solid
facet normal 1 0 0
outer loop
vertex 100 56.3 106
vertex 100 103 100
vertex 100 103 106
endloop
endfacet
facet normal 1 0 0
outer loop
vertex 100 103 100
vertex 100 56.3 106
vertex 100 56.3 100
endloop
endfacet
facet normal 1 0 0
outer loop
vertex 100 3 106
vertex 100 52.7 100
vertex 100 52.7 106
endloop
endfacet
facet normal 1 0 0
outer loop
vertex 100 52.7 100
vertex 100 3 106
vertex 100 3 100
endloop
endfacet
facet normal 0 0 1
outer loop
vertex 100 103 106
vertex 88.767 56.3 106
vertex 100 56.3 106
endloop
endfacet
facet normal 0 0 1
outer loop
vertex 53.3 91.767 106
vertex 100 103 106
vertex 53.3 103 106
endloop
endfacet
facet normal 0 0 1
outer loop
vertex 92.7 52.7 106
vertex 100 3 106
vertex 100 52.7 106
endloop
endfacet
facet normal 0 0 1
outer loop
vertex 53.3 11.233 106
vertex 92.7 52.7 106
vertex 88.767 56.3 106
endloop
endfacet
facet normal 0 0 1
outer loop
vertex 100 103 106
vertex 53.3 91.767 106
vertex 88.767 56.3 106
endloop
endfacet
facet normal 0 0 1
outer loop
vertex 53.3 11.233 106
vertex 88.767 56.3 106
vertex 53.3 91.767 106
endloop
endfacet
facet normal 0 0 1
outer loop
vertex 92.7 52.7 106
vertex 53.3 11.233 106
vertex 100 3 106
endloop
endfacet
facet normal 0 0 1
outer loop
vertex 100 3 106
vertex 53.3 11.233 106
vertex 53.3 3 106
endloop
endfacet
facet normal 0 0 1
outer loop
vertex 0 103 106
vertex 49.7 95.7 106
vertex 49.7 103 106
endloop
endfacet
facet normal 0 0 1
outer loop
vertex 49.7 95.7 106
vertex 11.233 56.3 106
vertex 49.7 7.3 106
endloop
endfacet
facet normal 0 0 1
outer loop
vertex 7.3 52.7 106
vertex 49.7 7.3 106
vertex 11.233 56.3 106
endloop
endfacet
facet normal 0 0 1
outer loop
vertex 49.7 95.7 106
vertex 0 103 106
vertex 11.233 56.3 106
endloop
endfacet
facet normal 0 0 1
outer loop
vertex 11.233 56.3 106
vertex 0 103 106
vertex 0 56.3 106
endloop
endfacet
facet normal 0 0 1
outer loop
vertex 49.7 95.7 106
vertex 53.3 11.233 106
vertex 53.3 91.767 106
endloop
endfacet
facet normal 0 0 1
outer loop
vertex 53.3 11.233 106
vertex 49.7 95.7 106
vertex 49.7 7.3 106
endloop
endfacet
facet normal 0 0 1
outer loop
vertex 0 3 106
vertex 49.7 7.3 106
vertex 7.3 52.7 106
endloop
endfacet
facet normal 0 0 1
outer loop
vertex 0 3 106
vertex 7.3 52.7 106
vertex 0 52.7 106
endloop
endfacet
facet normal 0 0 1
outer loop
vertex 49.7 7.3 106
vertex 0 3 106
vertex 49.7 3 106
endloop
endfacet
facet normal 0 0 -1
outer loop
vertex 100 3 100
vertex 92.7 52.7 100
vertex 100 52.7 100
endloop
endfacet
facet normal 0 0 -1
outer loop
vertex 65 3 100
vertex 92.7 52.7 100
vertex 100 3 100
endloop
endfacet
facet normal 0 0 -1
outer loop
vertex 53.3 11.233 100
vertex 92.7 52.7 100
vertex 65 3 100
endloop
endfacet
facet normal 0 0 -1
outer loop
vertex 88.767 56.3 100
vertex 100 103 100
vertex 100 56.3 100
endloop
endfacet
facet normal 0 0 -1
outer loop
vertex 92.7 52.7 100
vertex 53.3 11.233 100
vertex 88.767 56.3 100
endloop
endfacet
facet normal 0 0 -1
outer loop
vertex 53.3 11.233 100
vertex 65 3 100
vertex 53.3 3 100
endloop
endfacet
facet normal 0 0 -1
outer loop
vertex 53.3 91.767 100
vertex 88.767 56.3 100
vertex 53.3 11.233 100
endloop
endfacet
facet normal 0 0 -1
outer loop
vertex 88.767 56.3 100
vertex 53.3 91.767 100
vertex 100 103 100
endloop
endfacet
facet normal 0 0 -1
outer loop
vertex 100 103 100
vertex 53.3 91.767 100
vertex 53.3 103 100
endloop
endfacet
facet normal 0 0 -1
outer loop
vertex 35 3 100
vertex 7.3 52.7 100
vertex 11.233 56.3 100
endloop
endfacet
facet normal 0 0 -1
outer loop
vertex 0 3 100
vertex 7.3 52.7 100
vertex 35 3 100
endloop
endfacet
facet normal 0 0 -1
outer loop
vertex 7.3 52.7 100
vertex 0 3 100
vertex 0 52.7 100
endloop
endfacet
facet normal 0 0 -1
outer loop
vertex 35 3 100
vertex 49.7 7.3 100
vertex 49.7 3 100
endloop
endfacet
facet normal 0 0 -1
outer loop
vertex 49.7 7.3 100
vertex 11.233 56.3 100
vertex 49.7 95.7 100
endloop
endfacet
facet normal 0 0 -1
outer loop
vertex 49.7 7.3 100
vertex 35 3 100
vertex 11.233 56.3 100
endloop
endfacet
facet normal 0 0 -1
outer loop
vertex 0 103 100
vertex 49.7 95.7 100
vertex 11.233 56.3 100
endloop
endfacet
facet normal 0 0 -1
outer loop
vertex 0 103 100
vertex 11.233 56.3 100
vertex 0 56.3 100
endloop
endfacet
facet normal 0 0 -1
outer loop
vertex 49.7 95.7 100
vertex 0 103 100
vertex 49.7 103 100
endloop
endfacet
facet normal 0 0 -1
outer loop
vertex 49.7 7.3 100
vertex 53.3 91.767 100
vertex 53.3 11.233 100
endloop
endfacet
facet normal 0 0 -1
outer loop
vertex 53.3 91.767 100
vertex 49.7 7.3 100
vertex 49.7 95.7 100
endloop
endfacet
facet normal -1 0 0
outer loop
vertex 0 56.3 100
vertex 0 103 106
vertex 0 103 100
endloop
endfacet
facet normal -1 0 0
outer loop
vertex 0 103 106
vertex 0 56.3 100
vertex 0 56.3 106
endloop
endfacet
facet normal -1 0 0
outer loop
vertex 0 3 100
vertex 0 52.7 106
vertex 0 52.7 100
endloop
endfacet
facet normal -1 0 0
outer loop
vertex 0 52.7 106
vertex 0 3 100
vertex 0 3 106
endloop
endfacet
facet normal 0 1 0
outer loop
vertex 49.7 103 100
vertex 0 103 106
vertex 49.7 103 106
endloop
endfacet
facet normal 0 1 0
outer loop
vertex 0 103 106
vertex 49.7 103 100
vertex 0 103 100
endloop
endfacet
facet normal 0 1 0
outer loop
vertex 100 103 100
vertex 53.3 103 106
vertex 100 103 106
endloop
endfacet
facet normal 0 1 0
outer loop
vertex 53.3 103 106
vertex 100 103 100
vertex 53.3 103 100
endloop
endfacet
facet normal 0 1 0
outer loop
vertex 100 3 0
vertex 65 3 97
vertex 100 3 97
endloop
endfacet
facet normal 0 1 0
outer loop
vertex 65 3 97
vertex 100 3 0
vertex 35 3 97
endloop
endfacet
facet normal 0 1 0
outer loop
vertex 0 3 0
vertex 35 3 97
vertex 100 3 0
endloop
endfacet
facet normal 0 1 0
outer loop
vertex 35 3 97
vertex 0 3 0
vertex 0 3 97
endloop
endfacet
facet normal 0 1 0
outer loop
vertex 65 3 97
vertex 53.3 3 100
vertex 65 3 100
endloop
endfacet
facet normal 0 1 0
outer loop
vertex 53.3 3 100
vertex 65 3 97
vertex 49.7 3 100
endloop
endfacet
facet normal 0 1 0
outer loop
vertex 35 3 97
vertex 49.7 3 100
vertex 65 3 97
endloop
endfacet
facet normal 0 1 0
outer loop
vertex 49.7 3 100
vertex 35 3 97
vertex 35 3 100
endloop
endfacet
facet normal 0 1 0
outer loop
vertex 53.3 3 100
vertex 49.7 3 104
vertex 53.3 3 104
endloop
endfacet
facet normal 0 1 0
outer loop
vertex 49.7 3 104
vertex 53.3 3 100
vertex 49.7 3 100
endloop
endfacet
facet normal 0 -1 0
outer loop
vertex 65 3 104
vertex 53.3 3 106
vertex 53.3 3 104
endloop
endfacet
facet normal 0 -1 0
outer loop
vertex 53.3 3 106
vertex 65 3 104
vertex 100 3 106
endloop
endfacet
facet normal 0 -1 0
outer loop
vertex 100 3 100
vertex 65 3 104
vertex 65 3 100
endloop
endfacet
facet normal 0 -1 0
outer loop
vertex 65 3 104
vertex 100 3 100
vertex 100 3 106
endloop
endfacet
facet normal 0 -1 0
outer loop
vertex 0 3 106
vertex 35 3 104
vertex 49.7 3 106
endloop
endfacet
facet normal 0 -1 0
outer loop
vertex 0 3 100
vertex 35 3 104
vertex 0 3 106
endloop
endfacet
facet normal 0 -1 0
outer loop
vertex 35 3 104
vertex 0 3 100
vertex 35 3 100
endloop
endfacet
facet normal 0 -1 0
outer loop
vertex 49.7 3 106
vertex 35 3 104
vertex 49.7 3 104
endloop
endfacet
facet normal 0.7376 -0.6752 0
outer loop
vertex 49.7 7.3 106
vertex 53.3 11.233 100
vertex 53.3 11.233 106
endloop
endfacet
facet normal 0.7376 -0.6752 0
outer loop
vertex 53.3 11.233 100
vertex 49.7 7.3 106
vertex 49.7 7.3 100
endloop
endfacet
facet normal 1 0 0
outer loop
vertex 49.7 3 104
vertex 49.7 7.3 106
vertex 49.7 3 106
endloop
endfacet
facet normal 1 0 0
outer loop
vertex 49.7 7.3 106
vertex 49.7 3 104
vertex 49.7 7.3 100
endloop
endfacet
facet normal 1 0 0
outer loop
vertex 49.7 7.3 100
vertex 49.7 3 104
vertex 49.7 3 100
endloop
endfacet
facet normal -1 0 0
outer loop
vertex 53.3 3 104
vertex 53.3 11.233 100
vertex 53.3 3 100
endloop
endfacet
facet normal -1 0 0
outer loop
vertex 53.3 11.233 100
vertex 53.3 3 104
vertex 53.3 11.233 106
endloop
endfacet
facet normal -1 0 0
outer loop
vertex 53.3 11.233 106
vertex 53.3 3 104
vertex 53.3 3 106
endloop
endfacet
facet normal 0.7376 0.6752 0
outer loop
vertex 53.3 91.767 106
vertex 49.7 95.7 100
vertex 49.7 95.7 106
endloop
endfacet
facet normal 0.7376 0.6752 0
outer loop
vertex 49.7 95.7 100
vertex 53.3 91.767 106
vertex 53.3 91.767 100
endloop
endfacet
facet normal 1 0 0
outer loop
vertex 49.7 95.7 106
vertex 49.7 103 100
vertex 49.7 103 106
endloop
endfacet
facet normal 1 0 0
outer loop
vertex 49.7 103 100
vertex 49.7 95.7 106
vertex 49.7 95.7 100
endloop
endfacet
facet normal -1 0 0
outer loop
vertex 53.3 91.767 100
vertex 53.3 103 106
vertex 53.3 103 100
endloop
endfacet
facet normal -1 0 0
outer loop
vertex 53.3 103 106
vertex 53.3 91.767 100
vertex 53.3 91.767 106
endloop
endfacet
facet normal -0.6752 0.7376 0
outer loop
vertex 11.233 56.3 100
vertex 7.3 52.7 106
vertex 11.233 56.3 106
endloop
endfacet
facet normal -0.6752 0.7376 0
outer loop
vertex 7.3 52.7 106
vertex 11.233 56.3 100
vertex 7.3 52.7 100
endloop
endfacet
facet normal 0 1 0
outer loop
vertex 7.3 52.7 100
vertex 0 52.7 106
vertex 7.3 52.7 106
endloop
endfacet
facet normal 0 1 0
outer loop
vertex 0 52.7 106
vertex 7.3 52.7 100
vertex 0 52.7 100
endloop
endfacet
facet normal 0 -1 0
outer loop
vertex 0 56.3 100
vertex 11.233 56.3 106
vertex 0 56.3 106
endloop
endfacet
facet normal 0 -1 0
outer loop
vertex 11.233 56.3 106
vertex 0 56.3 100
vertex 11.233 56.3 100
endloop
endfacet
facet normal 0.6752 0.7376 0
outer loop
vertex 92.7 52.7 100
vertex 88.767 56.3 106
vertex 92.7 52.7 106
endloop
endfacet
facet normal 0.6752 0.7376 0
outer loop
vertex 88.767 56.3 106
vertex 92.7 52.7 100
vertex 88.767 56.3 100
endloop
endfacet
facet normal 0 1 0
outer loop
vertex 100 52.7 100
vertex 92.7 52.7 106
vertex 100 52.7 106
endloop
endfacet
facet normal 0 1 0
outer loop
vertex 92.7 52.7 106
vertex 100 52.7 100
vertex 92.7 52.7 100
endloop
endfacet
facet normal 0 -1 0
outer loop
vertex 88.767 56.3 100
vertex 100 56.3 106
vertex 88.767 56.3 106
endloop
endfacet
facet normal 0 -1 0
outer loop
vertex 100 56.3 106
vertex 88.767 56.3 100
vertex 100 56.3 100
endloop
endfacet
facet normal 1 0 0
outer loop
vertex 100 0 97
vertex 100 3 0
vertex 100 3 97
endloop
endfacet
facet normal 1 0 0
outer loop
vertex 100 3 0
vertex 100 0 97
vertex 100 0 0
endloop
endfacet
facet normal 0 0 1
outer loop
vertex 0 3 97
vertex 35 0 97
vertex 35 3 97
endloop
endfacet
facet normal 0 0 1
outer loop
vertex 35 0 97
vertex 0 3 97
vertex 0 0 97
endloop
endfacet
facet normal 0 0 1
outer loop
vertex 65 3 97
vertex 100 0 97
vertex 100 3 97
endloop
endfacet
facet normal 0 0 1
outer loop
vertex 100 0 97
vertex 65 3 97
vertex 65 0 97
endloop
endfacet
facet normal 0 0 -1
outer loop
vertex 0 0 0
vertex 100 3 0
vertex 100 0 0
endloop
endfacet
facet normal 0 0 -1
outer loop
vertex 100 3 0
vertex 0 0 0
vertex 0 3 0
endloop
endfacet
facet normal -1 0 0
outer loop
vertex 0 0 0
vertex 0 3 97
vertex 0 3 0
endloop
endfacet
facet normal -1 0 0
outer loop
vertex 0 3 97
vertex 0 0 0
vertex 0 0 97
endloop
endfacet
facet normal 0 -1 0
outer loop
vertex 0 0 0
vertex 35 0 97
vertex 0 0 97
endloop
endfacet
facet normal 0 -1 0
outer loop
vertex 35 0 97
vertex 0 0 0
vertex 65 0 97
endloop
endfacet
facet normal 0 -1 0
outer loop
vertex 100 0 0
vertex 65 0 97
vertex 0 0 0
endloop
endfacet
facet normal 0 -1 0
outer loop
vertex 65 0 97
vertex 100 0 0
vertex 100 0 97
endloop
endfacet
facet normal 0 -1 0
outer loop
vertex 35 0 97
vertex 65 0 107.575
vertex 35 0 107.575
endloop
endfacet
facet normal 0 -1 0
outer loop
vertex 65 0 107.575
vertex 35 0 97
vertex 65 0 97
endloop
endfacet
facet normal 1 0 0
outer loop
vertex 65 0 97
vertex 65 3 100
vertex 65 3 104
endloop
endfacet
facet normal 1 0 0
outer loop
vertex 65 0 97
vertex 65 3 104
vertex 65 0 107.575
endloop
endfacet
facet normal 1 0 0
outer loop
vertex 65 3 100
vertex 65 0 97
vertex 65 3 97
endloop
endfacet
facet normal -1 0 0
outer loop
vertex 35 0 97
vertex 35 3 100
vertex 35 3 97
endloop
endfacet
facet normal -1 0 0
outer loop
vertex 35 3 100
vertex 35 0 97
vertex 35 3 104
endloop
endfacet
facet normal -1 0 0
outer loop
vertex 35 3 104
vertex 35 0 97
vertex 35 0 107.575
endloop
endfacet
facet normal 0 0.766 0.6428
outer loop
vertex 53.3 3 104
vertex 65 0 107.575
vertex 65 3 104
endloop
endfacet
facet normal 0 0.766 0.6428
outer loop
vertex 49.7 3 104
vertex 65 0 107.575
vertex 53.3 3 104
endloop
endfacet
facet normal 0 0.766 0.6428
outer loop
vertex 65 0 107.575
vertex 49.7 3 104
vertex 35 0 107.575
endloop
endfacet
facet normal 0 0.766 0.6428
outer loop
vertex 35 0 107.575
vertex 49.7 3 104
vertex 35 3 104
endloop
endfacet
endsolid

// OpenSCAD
// file: ../panels/front_panel.scad
// Front Panel with Male Dovetail
// Male dovetail rail on top edge to mate with top panel

use <../modules/dovetail.scad>

// Panel parameters (can be overridden)
panel_width = 100;        // X dimension (matches top panel width)
panel_height = 100;       // Z dimension (vertical height of front panel)
panel_thickness = 3;      // Y dimension (wall thickness)

// Dovetail parameters (must match top panel channel)
dovetail_angle = 50;
dovetail_height = 3;      // Must match top panel channel height
dovetail_length = 30;
dovetail_base_width = 8;

// Scale factor for prototyping
scale_factor = 1.0;

// Scaled dimensions
scaled_width = panel_width * scale_factor;
scaled_panel_height = panel_height * scale_factor;
scaled_thickness = panel_thickness * scale_factor;
scaled_dovetail_height = dovetail_height * scale_factor;
scaled_dovetail_length = dovetail_length * scale_factor;
scaled_dovetail_base_width = dovetail_base_width * scale_factor;

module front_panel(
    width = scaled_width,
    panel_h = scaled_panel_height,
    thickness = scaled_thickness,
    dt_angle = dovetail_angle,
    dt_height = scaled_dovetail_height,
    dt_length = scaled_dovetail_length,
    dt_base_width = scaled_dovetail_base_width
) {
    // Panel is vertical: width in X, thickness in Y, height in Z
    // Origin at front-bottom-left corner

    union() {
        // Base panel - stops below dovetail
        cube([width, thickness, panel_h - dt_height]);

        // Male dovetail - top flush with panel top at Z=panel_h
        // After rotate([90,0,0]), dovetail base is at Z and widens toward -Z
        // Place at Z=panel_h so top is flush, dovetail extends down to panel_h-dt_height
        translate([width/2, thickness, panel_h])
            rotate([90, 0, 0])
            male_dovetail(
                length = dt_length,
                height = dt_height,
                base_width = dt_base_width,
                angle = dt_angle
            );
    }
}

// Render the panel
color("DarkGray") front_panel();
// file: ../panels/top_panel.scad
// Top Panel with Female Dovetails
// Female dovetail channels on all 4 edges, pointing inward

use <../modules/dovetail.scad>

// Panel parameters (can be overridden)
panel_width = 100;        // X dimension
panel_depth = 100;        // Y dimension
panel_thickness = 6;      // Z dimension (total panel thickness)

// Dovetail parameters
dovetail_angle = 50;
dovetail_height = 3;      // Trapezoid height (cut into bottom 3mm, leaving top 3mm solid)
dovetail_length = 30;
dovetail_base_width = 8;
clearance = 0.3;

// Scale factor for prototyping
scale_factor = 1.0;

// Scaled dimensions
scaled_width = panel_width * scale_factor;
scaled_depth = panel_depth * scale_factor;
scaled_thickness = panel_thickness * scale_factor;
scaled_dovetail_height = dovetail_height * scale_factor;
scaled_dovetail_length = dovetail_length * scale_factor;
scaled_dovetail_base_width = dovetail_base_width * scale_factor;
scaled_clearance = clearance * scale_factor;

module top_panel(
    width = scaled_width,
    depth = scaled_depth,
    thickness = scaled_thickness,
    dt_angle = dovetail_angle,
    dt_height = scaled_dovetail_height,
    dt_length = scaled_dovetail_length,
    dt_base_width = scaled_dovetail_base_width,
    dt_clearance = scaled_clearance
) {
    // Dovetail channel inset from panel edge
    dt_edge_inset = 3;  // How far from panel edge the channel center sits

    difference() {
        // Base panel
        // Origin at corner, panel extends in +X, +Y, +Z
        cube([width, depth, thickness]);

        // Female dovetail on front edge (Y=0)
        // Channel at front edge to mate with front panel's dovetail
        // (Front panel sits in front of top panel in assembly)
        translate([width/2, 0, 0])
            rotate([0, 0, 0])    // No rotation needed - channel opens upward (+Z)
            rotate([90, 0, 0])   // Rotate so length runs along X axis
            female_dovetail(
                length = dt_length,
                height = dt_height,
                base_width = dt_base_width,
                angle = dt_angle,
                clearance = dt_clearance
            );

        // Female dovetail on back edge (Y=depth)
        // Channel centered on X, inset from Y=depth edge
        translate([width/2, depth - dt_edge_inset, 0])
            rotate([0, 0, 0])
            rotate([90, 0, 0])
            female_dovetail(
                length = dt_length,
                height = dt_height,
                base_width = dt_base_width,
                angle = dt_angle,
                clearance = dt_clearance
            );

        // Female dovetail on left edge (X=0)
        // Channel centered on Y, inset from X=0 edge
        translate([dt_edge_inset, depth/2, 0])
            rotate([0, 0, 0])
            rotate([90, 0, 90])  // Rotate so length runs along Y axis
            female_dovetail(
                length = dt_length,
                height = dt_height,
                base_width = dt_base_width,
                angle = dt_angle,
                clearance = dt_clearance
            );

        // Female dovetail on right edge (X=width)
        // Channel centered on Y, inset from X=width edge
        translate([width - dt_edge_inset, depth/2, 0])
            rotate([0, 0, 0])
            rotate([90, 0, 90])
            female_dovetail(
                length = dt_length,
                height = dt_height,
                base_width = dt_base_width,
                angle = dt_angle,
                clearance = dt_clearance
            );
    }
}

// Render the panel
color("LightGray") top_panel();
// file: ../modules/dovetail.scad
// Dovetail Joint Primitives
// Chamfered dovetail joints for support-free 3D printing

// Default parameters
default_dovetail_angle = 50;      // Angle from vertical (degrees)
default_dovetail_height = 5;      // Trapezoid height (mm)
default_dovetail_length = 30;     // Length along edge (mm)
default_dovetail_base_width = 8;  // Width at narrow end (mm)
default_clearance = 0.3;          // Clearance per side (mm)

// Calculate top width from base width, height, and angle
function dovetail_top_width(base_width, height, angle) =
    base_width + 2 * height * tan(angle);

// Male dovetail rail - trapezoidal extrusion
// Origin at center of the rail base
// Cross-section in YZ plane: width in Y, height in +Z
// Extrudes along +X (length direction)
// Rail widens in +Z direction (trapezoid shape)
module male_dovetail(
    length = default_dovetail_length,
    height = default_dovetail_height,
    base_width = default_dovetail_base_width,
    angle = default_dovetail_angle
) {
    top_width = dovetail_top_width(base_width, height, angle);

    // Trapezoidal cross-section rotated 90° CW on Z then 90° CW on X
    rotate([-90, 180, 90])
    linear_extrude(height = length, center = true)
        polygon([
            [-base_width/2, 0],      // bottom left
            [base_width/2, 0],       // bottom right
            [top_width/2, height],   // top right
            [-top_width/2, height]   // top left
        ]);
}

// Female dovetail channel - trapezoidal cutout
// Same profile as male but with clearance added
// Origin at center of the channel base
// Cross-section in YZ plane: width in Y, height in +Z
// Extrudes along +X (length direction)
// Channel widens in +Z direction (trapezoid shape)
module female_dovetail(
    length = default_dovetail_length,
    height = default_dovetail_height,
    base_width = default_dovetail_base_width,
    angle = default_dovetail_angle,
    clearance = default_clearance
) {
    // Add clearance to all dimensions
    adj_base_width = base_width + 2 * clearance;
    adj_height = height + clearance;
    top_width = dovetail_top_width(adj_base_width, adj_height, angle);
    adj_length = length + 2 * clearance;

    // Trapezoidal cross-section rotated 90° CW on Z then 90° CW on X
    rotate([-90, 0, 0])
    rotate([0, 0, -90])
    linear_extrude(height = adj_length, center = true)
        polygon([
            [-adj_base_width/2, -clearance],  // bottom left (extra height for clearance)
            [adj_base_width/2, -clearance],   // bottom right
            [top_width/2, adj_height],        // top right
            [-top_width/2, adj_height]        // top left
        ]);
}

// Test visualization
module dovetail_test() {
    // Show male (red) and female (blue, transparent) overlapping
    color("red") male_dovetail();
    color("blue", 0.3) female_dovetail();
}

// Uncomment to test
dovetail_test();
// main file
// Dovetailed Shell Assembly
// Top panel + Front panel joined via dovetail

use <../modules/dovetail.scad>
use <../panels/top_panel.scad>
use <../panels/front_panel.scad>

// Shared parameters - adjust these to match panels
panel_width = 100;
panel_depth = 100;
panel_height = 100;
top_panel_thickness = 6;      // Top panel is 6mm thick
front_panel_thickness = 3;    // Front panel is 3mm thick

// Dovetail parameters
dovetail_angle = 50;
dovetail_height = 3;          // Trapezoid height (3mm into 6mm top panel)
dovetail_length = 30;
dovetail_base_width = 8;
clearance = 0.3;

// Scale factor for prototyping (0.5 = half size)
scale_factor = 1.0;

// Scaled dimensions
scaled_width = panel_width * scale_factor;
scaled_depth = panel_depth * scale_factor;
scaled_panel_height = panel_height * scale_factor;
scaled_top_thickness = top_panel_thickness * scale_factor;
scaled_front_thickness = front_panel_thickness * scale_factor;
scaled_dovetail_height = dovetail_height * scale_factor;
scaled_dovetail_length = dovetail_length * scale_factor;
scaled_dovetail_base_width = dovetail_base_width * scale_factor;
scaled_clearance = clearance * scale_factor;

// Assembly toggles
show_top_panel = true;
show_front_panel = true;
explode = 0;  // Set > 0 to separate panels for visualization (20-30 works well)

module assembly() {
    // Top panel positioned at top of assembly
    // Shifted back in Y so front panel sits in front of it
    // Panel bottom face at Z = scaled_panel_height (front panel top)
    if (show_top_panel) {
        translate([0, scaled_front_thickness, scaled_panel_height + explode])
            color("LightGray")
            top_panel(
                width = scaled_width,
                depth = scaled_depth,
                thickness = scaled_top_thickness,
                dt_angle = dovetail_angle,
                dt_height = scaled_dovetail_height,
                dt_length = scaled_dovetail_length,
                dt_base_width = scaled_dovetail_base_width,
                dt_clearance = scaled_clearance
            );
    }

    // Front panel at Y=0 (front face of assembly at Y=0)
    // Height spans from Z=0 to Z=scaled_panel_height
    // Male dovetail on top edge extends into top panel's front channel
    if (show_front_panel) {
        translate([0, -explode, 0])
            color("DarkGray")
            front_panel(
                width = scaled_width,
                panel_h = scaled_panel_height,
                thickness = scaled_front_thickness,
                dt_angle = dovetail_angle,
                dt_height = scaled_dovetail_height,
                dt_length = scaled_dovetail_length,
                dt_base_width = scaled_dovetail_base_width
            );
    }
}

// Calculate overall assembly dimensions for reference
assembly_width = scaled_width;
assembly_depth = scaled_depth;
assembly_height = scaled_panel_height + scaled_top_thickness;

// Render the assembly
assembly();

// Reference dimensions (uncomment to visualize bounding box)
// %cube([scaled_width, scaled_depth, scaled_height + scaled_thickness]);
